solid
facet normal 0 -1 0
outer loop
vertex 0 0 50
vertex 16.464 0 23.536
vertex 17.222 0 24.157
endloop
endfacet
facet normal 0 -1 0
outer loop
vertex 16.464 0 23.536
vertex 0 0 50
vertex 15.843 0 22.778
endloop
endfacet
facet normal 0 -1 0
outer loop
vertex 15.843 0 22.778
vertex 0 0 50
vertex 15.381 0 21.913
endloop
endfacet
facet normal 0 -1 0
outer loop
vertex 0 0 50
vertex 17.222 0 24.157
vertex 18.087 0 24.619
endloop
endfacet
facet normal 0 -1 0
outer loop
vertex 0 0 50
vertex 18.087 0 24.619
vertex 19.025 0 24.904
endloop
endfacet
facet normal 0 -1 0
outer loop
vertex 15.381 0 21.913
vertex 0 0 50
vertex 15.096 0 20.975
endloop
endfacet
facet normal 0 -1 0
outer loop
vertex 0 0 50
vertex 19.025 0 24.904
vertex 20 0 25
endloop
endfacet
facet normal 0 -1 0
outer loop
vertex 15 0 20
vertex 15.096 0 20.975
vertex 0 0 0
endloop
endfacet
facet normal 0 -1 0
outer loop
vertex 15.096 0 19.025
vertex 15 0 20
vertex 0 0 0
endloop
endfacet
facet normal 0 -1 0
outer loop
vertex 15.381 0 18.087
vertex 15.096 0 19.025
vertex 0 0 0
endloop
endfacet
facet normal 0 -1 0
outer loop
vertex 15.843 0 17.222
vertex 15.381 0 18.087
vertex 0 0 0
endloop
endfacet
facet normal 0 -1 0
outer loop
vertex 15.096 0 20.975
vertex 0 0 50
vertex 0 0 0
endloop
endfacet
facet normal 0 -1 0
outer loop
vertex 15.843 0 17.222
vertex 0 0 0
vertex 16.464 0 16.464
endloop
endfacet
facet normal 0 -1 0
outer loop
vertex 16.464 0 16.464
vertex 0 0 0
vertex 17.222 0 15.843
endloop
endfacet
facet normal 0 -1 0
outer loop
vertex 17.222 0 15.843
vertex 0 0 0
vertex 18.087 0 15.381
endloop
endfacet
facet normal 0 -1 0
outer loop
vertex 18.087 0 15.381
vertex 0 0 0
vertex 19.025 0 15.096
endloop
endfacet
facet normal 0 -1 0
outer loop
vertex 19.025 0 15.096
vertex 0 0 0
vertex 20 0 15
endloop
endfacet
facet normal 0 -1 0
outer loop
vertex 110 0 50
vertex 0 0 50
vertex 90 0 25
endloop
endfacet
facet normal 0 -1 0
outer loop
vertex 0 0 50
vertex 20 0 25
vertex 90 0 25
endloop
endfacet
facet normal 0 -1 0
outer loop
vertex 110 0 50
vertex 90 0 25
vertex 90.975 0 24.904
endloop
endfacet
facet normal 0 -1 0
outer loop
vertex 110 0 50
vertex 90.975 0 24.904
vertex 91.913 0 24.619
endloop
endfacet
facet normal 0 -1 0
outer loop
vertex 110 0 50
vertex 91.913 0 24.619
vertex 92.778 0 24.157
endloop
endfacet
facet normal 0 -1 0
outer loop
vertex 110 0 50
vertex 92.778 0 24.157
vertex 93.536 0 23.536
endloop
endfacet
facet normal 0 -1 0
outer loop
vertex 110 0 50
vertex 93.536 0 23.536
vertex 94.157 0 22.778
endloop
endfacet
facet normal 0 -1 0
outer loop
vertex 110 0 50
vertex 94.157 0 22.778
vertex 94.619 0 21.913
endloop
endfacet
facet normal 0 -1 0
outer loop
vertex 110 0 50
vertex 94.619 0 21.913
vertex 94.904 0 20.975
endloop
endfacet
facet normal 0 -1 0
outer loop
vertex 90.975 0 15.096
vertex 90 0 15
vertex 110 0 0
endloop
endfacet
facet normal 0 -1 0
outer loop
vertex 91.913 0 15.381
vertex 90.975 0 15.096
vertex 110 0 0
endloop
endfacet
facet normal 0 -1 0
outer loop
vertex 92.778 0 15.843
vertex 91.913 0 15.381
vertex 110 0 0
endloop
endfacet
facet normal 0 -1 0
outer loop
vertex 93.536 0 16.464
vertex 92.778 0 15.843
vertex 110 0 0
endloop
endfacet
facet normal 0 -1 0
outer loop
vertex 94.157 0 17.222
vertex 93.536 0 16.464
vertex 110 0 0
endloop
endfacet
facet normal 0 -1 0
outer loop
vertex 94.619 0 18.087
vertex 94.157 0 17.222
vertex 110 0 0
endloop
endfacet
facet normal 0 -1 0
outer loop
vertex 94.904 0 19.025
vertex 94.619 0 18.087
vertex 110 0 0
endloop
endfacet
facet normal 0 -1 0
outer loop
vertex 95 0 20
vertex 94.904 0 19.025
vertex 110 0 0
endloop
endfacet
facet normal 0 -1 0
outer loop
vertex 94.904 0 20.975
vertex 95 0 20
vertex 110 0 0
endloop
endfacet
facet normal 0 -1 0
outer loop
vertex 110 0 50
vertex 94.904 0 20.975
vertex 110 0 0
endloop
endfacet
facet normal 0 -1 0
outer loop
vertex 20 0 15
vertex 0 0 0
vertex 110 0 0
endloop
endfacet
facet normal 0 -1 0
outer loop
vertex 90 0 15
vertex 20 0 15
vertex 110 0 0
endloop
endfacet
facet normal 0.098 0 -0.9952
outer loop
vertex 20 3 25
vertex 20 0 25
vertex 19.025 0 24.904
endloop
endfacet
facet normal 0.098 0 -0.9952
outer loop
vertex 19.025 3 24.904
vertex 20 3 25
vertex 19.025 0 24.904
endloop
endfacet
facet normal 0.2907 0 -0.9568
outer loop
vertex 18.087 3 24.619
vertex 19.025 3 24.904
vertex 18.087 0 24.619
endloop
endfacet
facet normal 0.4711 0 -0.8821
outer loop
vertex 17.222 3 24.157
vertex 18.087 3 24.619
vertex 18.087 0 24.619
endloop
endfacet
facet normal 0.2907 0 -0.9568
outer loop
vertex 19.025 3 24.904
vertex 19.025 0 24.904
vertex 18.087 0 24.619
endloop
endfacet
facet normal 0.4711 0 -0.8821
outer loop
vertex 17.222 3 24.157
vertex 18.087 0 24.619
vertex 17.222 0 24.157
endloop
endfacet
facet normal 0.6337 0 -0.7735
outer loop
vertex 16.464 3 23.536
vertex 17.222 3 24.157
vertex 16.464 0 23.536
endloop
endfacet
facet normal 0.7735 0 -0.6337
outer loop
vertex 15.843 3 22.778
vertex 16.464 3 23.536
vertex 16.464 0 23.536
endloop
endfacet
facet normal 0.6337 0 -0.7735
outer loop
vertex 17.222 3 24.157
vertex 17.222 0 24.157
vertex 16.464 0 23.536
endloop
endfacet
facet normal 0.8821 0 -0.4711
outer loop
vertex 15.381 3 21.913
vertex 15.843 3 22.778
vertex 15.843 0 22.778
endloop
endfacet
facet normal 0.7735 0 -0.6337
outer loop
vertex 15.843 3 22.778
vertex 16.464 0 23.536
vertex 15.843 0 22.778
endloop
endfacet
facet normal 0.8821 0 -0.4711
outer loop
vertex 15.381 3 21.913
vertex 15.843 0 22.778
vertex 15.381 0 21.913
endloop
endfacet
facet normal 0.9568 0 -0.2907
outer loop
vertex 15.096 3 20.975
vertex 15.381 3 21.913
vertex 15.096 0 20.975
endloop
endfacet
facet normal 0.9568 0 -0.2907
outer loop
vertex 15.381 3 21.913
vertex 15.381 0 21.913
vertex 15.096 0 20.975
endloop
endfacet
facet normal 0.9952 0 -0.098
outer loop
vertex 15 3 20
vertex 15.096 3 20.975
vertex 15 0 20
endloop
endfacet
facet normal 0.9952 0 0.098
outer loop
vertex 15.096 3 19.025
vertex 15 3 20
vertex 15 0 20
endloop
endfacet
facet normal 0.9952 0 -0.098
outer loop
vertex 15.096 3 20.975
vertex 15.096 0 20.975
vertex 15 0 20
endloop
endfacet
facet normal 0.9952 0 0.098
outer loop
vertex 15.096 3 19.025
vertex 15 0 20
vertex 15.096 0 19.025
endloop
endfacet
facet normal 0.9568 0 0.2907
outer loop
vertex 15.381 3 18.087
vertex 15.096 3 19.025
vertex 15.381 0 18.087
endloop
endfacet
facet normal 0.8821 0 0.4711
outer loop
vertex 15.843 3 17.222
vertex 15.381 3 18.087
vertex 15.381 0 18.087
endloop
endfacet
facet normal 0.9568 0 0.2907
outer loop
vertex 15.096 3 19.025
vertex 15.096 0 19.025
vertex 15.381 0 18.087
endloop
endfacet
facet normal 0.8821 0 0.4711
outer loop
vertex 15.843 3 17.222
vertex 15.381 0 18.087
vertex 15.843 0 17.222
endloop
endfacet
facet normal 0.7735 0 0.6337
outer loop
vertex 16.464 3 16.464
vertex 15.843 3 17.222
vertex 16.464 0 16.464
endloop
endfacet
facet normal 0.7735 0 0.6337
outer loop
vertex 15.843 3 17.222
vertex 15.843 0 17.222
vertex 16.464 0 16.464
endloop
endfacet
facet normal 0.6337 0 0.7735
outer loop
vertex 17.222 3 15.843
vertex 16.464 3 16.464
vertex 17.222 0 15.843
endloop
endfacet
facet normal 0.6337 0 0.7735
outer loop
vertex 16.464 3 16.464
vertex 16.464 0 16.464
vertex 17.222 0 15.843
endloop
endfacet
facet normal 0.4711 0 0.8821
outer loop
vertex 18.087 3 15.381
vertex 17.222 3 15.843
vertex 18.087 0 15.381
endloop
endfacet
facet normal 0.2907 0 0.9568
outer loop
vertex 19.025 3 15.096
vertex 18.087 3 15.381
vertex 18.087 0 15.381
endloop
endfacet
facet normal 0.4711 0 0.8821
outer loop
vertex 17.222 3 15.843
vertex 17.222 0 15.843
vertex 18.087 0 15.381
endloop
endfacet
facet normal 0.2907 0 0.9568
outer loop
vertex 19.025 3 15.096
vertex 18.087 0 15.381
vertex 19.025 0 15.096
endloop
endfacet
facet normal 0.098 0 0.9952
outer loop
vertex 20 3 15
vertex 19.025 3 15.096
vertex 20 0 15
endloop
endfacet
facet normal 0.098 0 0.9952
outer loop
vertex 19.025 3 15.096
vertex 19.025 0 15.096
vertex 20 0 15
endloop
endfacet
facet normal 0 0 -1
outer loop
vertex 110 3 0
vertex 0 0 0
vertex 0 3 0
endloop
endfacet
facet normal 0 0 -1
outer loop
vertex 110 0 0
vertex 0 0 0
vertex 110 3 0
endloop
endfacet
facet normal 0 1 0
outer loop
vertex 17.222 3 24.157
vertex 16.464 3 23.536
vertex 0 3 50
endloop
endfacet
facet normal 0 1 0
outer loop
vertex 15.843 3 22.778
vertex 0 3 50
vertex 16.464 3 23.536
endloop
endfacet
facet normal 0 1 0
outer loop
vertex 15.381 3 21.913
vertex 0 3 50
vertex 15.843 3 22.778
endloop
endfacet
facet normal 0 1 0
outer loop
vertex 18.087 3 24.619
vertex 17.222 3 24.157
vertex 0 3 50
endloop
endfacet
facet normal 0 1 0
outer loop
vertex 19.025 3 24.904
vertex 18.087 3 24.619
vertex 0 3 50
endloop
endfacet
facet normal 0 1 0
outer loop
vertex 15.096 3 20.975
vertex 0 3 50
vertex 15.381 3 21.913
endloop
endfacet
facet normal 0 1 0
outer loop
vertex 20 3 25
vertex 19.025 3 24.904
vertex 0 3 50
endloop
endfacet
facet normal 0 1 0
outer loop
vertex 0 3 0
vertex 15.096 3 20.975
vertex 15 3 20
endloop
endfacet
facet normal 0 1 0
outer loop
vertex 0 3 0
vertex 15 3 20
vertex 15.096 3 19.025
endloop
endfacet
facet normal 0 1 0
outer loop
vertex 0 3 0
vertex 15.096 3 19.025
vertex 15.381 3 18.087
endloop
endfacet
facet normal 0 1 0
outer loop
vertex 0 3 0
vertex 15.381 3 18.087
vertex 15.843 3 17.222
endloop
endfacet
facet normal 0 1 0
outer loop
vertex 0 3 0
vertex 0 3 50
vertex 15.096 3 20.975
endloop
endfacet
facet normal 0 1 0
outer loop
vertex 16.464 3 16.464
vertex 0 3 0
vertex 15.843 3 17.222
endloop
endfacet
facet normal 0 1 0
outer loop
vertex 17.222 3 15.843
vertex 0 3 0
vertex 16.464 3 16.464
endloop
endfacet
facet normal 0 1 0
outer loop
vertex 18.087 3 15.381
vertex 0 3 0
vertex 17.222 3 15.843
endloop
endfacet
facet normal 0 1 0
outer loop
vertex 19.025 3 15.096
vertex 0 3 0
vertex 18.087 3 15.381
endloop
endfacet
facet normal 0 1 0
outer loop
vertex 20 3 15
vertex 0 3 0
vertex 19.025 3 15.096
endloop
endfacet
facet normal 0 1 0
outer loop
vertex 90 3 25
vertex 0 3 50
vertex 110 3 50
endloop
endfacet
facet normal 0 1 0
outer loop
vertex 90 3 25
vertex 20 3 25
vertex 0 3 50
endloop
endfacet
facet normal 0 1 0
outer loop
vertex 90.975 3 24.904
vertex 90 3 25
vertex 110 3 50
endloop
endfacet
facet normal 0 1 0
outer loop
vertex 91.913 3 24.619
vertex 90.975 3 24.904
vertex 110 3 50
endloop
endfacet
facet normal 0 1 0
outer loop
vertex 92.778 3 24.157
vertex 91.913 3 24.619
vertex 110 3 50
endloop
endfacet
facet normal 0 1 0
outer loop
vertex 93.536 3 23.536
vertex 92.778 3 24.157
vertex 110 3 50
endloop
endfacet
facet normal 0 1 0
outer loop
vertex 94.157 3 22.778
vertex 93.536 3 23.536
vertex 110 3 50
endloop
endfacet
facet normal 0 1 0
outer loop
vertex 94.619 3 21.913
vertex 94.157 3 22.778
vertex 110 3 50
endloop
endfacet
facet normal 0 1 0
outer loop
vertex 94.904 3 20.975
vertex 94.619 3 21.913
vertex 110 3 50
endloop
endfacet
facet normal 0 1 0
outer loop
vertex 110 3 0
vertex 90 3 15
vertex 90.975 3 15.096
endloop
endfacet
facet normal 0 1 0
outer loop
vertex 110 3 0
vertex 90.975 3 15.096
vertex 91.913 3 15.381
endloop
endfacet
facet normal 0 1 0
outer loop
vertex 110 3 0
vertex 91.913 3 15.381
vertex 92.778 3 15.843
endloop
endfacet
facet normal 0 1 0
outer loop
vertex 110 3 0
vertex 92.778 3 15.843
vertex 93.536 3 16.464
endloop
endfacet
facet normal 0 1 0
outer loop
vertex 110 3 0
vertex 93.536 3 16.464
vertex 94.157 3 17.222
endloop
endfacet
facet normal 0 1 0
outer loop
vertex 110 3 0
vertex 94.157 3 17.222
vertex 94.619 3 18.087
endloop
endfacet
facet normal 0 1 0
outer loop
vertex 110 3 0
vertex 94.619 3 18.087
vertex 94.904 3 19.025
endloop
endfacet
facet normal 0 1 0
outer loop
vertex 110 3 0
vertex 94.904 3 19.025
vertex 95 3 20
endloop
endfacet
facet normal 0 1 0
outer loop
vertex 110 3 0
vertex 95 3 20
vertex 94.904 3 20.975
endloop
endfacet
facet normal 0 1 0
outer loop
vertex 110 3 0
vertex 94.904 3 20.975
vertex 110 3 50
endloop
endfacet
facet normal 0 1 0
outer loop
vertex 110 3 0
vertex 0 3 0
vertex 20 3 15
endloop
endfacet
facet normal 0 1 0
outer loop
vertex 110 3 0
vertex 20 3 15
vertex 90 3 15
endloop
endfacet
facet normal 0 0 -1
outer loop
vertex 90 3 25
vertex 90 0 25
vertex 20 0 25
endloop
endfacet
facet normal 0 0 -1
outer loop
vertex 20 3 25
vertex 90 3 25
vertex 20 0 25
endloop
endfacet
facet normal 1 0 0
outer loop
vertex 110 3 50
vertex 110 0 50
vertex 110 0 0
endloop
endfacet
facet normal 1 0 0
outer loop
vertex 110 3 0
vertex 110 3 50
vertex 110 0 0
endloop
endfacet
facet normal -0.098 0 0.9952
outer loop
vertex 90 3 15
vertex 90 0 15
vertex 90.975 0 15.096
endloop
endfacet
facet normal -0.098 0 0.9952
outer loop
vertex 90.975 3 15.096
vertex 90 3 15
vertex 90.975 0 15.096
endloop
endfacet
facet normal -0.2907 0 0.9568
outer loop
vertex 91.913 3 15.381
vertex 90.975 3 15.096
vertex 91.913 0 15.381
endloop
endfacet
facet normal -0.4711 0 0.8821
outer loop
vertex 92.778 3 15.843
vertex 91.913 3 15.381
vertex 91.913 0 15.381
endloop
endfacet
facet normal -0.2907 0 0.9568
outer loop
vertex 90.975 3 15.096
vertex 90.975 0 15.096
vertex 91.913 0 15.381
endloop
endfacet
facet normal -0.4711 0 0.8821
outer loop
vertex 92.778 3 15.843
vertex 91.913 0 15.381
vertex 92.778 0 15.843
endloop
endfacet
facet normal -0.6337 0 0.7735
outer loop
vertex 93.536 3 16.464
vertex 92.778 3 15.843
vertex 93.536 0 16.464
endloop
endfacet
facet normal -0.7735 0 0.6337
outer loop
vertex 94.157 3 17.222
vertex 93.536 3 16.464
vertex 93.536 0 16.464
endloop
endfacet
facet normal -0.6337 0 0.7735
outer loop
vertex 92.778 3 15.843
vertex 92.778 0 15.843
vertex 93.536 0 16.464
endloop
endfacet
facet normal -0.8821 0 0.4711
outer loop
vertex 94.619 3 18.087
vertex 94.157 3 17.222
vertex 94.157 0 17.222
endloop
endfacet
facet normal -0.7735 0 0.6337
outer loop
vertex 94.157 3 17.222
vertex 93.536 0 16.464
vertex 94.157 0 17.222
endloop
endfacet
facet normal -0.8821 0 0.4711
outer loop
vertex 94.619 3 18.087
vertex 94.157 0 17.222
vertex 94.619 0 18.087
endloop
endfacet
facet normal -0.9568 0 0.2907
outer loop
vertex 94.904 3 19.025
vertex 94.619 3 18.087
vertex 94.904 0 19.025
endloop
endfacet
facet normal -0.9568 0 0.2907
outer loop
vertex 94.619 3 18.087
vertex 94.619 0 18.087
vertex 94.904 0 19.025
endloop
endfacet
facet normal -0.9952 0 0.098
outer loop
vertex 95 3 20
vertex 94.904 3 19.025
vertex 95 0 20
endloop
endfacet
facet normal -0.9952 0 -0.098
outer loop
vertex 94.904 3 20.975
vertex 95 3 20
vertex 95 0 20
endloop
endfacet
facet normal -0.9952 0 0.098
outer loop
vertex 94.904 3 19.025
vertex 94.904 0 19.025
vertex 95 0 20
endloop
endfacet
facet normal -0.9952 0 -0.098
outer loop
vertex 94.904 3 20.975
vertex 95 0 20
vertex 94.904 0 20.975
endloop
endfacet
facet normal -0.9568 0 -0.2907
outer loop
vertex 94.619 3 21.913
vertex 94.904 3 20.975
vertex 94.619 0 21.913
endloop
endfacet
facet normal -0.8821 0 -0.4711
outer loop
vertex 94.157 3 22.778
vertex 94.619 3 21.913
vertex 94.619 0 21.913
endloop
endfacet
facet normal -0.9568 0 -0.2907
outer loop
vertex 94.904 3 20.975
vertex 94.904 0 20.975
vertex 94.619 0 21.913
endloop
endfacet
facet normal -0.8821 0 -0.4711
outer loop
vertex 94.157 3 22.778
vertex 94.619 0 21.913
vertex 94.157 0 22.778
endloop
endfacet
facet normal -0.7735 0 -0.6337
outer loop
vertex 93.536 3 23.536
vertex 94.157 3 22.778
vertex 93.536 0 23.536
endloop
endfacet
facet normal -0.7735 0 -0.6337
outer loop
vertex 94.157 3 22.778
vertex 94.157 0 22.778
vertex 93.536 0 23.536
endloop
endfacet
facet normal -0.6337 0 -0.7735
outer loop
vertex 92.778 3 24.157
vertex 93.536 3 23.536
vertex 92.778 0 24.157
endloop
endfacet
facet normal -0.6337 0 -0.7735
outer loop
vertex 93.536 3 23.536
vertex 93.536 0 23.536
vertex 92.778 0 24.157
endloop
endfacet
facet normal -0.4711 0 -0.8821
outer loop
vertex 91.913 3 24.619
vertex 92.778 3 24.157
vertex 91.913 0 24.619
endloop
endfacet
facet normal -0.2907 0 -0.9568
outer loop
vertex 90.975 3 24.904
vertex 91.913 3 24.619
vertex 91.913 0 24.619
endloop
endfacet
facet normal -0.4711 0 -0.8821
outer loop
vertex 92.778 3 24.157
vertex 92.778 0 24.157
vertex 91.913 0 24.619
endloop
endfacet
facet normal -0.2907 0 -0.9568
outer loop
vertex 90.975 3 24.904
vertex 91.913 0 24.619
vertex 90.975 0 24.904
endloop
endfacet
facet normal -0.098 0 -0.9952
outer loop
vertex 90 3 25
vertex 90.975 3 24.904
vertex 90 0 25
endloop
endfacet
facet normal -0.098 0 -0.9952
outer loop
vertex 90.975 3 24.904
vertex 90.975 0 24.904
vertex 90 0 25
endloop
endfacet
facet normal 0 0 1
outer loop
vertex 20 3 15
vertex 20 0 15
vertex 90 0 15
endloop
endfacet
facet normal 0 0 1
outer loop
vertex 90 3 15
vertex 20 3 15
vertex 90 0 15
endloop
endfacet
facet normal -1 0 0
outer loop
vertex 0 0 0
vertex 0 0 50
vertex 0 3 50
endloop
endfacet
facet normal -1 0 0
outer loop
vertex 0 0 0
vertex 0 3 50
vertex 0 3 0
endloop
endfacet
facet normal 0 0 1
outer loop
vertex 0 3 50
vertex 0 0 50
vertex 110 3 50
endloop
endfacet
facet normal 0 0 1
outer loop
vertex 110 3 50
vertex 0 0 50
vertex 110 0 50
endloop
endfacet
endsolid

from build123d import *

# Parameters (mm, degrees)
IZIM1_W                     = 110
IZIM1_H                     = 50
Y_KSEKLIK_EKSTR_ZYON1_DEPTH = 3


with BuildPart() as part:
    # Çizim1 → Yükseklik-Ekstrüzyon1 (new body)
    with BuildSketch(Plane(origin=(0, 0, 0), x_dir=(1, 0, 0), z_dir=(0, 1, 0))):
        with Locations((55, -25)):
            Rectangle(IZIM1_W, IZIM1_H)
        with BuildLine():
            Line((20, -15), (90, -15))
            ThreePointArc((90, -15), (95, -20), (90, -25))
            Line((90, -25), (20, -25))
            ThreePointArc((20, -25), (15, -20), (20, -15))
        make_face(mode=Mode.SUBTRACT)
    extrude(amount=Y_KSEKLIK_EKSTR_ZYON1_DEPTH)


solid = part.part
